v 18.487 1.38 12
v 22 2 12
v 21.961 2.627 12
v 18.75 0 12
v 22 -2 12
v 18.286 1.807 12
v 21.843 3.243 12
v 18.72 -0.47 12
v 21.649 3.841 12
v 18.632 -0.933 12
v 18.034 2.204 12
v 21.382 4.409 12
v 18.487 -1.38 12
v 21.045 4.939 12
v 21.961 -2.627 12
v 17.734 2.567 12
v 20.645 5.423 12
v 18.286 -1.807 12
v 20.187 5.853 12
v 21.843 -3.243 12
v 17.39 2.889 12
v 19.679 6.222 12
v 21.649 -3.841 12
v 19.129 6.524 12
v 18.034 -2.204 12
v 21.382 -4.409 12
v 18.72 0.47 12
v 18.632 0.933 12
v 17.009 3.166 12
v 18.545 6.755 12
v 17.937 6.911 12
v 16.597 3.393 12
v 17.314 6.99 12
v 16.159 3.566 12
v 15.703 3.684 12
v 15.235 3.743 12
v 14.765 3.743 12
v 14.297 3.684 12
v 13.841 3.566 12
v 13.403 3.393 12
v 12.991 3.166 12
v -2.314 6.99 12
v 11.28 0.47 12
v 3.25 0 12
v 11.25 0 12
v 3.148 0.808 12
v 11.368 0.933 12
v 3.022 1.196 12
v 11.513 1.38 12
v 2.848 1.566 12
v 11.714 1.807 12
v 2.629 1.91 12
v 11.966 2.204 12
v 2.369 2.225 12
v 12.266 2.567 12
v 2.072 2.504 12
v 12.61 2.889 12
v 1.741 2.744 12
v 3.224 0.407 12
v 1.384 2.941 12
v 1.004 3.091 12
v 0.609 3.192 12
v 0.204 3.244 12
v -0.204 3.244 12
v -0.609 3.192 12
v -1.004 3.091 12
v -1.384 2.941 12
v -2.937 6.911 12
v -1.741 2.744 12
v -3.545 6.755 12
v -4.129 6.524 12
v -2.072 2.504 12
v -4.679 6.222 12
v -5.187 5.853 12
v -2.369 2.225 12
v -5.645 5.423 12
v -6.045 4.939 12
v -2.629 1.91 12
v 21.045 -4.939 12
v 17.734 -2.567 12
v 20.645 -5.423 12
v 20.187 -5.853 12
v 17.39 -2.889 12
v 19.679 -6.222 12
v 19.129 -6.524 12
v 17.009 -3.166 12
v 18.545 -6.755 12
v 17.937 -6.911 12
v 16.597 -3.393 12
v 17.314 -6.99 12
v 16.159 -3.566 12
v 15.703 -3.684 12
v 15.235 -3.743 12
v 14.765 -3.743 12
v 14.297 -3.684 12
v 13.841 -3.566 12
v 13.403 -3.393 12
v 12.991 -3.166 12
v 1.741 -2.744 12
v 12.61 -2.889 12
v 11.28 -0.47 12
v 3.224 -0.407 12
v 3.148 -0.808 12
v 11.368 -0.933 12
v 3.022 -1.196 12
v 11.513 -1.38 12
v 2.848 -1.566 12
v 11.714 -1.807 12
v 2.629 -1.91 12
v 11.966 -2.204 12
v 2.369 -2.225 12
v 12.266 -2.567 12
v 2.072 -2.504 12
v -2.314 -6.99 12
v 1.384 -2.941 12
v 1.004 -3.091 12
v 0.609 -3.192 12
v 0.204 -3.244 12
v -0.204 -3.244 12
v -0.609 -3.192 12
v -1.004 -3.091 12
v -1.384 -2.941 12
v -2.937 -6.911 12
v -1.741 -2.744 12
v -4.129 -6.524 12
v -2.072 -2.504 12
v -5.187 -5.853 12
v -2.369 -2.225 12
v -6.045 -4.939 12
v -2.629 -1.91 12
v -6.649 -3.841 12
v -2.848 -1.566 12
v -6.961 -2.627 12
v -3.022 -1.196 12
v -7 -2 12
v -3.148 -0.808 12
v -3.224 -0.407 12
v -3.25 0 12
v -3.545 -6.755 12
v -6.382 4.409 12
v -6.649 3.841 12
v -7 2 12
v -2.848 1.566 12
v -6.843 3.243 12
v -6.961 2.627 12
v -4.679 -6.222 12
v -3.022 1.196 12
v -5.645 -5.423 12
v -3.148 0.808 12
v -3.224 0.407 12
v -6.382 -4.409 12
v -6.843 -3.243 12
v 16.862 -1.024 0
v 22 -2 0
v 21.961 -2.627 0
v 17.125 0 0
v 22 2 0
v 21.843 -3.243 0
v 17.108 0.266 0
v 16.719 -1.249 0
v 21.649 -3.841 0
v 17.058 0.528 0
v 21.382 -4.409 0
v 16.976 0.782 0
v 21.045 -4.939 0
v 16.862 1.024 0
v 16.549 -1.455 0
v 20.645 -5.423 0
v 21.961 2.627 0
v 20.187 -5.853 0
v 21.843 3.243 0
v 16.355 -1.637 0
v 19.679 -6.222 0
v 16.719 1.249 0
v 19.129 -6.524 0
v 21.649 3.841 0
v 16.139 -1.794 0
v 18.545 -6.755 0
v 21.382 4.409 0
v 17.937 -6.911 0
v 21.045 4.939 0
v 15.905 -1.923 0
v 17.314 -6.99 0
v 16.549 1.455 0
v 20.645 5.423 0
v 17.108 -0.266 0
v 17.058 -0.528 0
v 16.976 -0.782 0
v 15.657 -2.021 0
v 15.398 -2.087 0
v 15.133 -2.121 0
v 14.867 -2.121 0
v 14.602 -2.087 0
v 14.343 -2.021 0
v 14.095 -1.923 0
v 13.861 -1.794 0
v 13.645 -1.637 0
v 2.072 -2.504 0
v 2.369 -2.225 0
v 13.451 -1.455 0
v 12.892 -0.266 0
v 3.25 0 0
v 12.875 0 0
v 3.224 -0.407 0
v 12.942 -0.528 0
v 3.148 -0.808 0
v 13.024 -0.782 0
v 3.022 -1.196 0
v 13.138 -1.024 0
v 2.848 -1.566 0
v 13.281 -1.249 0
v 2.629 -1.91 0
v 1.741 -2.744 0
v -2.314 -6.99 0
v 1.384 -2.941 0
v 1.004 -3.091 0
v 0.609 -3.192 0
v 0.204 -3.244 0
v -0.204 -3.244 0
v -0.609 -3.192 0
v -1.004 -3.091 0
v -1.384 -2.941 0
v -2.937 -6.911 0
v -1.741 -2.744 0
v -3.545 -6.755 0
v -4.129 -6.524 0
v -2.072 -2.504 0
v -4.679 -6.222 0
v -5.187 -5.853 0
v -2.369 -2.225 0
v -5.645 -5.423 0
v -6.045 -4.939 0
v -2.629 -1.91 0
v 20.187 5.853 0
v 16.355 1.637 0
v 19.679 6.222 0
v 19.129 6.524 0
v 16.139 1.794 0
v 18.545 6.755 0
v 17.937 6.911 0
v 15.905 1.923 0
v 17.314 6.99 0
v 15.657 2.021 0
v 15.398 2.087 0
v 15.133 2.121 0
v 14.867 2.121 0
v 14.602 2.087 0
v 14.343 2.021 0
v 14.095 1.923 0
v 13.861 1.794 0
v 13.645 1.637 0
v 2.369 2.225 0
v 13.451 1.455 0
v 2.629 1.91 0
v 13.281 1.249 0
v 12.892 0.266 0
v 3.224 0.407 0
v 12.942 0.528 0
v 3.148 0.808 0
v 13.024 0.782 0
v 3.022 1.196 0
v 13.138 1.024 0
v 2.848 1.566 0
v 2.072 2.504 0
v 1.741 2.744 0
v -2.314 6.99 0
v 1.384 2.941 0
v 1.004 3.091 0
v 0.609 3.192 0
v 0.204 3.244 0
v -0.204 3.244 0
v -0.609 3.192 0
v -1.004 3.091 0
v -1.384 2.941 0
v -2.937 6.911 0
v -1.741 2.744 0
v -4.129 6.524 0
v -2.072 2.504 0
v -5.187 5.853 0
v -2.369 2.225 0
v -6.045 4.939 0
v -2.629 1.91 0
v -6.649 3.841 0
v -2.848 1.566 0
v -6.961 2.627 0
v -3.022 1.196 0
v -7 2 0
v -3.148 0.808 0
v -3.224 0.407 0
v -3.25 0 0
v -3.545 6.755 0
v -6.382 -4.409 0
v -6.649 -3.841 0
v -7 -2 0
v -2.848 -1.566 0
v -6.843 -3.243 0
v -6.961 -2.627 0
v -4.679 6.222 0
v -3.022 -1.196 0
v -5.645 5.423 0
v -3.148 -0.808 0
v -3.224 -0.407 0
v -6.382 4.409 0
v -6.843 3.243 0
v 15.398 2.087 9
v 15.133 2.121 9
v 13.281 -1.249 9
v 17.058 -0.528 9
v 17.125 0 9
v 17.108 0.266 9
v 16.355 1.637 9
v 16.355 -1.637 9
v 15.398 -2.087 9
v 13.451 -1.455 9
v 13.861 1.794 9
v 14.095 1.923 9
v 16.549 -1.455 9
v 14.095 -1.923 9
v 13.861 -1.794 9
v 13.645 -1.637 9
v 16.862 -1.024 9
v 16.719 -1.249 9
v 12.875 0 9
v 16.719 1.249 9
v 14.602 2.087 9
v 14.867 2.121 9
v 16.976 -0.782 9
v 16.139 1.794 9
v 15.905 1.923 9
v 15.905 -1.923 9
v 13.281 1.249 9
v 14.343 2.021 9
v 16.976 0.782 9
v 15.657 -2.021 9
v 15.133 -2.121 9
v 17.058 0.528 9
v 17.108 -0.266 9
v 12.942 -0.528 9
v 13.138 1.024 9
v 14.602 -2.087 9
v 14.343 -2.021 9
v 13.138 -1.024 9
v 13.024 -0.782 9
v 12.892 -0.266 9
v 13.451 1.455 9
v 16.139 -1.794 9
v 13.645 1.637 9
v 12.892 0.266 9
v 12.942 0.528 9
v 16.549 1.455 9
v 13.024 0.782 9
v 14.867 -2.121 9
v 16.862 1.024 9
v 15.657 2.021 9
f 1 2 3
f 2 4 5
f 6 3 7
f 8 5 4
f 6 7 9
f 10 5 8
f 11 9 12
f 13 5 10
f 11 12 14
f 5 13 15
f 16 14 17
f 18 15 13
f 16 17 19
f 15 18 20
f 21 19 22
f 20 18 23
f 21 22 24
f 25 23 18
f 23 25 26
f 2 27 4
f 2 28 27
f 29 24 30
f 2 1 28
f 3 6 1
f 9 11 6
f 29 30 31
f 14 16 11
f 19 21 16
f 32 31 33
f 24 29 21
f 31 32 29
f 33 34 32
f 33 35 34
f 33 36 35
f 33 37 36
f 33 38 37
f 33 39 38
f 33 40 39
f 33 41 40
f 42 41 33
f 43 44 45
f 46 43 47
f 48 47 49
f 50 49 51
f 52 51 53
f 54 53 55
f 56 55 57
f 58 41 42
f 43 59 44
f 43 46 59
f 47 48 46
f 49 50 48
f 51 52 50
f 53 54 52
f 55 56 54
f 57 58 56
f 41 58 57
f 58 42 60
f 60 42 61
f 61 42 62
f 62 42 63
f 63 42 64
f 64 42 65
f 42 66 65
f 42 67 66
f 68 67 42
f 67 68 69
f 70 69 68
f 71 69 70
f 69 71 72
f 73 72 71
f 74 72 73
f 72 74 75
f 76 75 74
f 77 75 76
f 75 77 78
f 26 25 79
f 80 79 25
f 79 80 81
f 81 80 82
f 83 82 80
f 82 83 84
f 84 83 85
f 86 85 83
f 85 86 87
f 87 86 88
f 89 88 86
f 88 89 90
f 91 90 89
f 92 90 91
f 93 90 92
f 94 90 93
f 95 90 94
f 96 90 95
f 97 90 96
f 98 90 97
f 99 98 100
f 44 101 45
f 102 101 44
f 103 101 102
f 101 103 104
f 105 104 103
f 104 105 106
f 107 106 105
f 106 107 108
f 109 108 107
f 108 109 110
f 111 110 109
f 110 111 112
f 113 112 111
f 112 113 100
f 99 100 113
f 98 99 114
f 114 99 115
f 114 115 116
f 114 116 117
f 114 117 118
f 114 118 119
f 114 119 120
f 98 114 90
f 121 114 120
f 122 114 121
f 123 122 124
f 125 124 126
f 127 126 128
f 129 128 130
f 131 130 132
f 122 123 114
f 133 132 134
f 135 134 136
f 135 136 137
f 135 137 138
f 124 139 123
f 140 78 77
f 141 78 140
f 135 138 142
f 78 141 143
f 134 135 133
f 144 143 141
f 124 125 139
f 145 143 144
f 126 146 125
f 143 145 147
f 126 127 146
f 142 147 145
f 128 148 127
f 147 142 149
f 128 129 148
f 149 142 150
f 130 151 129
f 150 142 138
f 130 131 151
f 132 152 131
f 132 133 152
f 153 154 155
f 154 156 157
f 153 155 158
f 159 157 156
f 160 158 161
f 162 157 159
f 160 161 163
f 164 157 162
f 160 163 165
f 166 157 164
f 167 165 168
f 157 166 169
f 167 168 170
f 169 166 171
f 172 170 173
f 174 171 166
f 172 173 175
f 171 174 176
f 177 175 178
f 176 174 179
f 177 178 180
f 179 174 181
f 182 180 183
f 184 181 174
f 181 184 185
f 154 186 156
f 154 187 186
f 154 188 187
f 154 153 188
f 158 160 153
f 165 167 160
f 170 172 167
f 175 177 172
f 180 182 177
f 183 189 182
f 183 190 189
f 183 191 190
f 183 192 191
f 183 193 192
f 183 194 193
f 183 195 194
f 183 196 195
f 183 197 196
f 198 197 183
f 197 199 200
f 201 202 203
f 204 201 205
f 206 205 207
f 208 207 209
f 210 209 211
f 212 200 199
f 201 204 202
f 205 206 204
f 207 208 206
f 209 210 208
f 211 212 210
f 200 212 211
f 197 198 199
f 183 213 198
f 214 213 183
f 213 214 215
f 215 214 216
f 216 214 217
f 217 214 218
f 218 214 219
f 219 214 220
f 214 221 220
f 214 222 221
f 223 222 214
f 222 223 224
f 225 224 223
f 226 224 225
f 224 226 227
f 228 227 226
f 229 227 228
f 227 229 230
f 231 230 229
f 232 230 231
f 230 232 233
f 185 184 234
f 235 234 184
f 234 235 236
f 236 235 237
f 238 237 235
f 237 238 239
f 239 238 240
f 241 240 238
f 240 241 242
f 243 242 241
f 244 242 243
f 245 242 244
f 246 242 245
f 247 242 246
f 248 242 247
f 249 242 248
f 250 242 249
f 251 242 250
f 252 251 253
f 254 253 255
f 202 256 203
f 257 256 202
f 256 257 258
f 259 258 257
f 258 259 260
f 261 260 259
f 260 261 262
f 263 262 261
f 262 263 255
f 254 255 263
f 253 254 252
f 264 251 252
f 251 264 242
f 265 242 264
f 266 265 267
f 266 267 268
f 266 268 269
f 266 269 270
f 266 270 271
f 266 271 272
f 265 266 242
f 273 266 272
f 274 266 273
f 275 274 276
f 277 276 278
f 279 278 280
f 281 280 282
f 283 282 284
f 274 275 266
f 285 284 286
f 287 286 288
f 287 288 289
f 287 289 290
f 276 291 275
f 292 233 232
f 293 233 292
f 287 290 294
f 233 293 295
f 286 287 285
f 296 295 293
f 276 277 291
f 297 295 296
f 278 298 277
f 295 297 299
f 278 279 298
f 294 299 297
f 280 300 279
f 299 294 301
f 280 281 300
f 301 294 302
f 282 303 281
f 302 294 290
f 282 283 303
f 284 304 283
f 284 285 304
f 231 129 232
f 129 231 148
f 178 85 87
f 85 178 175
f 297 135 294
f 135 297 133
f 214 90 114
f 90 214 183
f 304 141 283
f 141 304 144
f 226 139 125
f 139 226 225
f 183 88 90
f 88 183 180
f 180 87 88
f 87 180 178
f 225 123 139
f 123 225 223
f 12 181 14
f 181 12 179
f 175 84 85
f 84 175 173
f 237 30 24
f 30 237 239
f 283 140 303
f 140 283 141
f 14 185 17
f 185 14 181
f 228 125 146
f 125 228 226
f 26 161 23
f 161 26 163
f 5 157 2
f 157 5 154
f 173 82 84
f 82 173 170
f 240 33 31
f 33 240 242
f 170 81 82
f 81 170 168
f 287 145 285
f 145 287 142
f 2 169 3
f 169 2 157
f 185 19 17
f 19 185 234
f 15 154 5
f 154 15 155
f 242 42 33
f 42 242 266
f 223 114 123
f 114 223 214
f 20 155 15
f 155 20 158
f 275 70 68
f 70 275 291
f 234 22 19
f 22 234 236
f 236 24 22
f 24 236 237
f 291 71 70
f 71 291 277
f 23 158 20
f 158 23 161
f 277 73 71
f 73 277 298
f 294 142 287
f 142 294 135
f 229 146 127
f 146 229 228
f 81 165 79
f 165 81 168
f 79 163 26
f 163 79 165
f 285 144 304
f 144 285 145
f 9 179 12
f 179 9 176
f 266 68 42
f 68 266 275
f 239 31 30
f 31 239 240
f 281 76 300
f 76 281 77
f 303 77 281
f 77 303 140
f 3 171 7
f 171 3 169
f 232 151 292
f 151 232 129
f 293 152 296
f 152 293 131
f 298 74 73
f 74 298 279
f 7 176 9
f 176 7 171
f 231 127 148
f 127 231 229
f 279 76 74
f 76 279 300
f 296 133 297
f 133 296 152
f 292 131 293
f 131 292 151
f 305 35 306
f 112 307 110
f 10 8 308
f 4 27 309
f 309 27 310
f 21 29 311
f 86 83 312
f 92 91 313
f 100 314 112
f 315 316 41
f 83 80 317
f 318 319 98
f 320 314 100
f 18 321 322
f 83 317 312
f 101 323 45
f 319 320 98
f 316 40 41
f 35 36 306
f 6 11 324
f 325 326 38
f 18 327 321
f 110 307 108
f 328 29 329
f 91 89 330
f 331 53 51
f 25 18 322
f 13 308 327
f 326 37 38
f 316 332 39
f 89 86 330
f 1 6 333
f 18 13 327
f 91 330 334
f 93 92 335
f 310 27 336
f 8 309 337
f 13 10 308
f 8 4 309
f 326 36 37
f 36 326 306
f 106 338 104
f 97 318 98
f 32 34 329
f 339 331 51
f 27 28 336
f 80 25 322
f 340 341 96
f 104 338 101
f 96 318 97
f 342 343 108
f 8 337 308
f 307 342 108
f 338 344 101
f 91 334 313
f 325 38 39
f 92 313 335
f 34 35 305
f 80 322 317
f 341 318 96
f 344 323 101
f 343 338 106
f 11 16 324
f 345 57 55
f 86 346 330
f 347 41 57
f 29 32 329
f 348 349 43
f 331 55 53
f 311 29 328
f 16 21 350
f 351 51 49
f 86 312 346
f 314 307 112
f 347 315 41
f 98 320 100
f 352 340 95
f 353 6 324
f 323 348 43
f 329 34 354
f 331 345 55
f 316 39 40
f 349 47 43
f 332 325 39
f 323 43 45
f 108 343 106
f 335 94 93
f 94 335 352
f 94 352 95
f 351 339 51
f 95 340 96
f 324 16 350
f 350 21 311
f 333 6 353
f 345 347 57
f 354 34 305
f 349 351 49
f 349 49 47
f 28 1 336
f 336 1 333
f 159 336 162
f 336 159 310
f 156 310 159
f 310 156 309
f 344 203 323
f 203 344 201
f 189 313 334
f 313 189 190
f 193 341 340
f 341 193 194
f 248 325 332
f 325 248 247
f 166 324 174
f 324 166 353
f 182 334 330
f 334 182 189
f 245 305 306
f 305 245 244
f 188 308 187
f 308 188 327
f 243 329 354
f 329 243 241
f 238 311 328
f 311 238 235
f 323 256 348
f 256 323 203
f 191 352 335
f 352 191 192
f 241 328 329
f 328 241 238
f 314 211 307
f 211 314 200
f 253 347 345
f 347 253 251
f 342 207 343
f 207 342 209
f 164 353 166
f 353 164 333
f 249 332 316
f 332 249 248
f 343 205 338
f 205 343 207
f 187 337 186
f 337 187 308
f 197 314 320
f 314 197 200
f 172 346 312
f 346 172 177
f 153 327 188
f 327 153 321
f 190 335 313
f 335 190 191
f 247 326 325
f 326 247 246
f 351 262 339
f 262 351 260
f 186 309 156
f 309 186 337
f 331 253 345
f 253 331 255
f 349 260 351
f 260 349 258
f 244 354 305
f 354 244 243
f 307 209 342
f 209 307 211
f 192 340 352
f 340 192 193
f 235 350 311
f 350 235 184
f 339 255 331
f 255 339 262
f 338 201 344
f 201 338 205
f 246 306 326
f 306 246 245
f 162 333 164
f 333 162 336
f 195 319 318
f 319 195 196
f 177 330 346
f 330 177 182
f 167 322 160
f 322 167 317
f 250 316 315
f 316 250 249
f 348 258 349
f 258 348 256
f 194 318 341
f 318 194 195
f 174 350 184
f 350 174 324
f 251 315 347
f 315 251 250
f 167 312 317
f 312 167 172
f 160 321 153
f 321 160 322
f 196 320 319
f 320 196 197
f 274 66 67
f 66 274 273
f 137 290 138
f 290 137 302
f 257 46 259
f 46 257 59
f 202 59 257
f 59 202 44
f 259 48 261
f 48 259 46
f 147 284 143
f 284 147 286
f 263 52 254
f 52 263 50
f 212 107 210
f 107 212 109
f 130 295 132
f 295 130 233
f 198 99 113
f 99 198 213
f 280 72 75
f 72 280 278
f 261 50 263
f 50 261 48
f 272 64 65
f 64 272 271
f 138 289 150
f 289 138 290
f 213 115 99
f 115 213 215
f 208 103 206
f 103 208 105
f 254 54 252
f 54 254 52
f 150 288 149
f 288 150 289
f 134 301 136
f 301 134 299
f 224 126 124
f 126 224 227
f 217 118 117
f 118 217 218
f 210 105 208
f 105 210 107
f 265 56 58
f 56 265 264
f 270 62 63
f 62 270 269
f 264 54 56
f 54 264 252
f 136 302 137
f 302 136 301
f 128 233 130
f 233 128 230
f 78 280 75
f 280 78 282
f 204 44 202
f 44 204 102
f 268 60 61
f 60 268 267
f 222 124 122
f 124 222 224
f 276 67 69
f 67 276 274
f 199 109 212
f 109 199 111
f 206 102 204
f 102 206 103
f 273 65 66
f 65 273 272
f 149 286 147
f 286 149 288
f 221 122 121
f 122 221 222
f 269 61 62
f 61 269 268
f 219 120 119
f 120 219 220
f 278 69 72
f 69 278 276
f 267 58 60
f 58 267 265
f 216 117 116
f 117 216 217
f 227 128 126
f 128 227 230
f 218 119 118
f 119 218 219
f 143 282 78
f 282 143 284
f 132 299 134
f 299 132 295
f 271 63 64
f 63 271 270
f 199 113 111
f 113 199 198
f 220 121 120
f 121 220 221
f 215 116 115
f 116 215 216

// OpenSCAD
$fn = 50;


difference() {
	union() {
		cylinder(h = 12, r = 7.0000000000);
		translate(v = [7.5000000000, 0.0000000000, 0]) {
			hull() {
				translate(v = [-9.5000000000, 2.0000000000, 0]) {
					cylinder(h = 12, r = 5);
				}
				translate(v = [9.5000000000, 2.0000000000, 0]) {
					cylinder(h = 12, r = 5);
				}
				translate(v = [-9.5000000000, -2.0000000000, 0]) {
					cylinder(h = 12, r = 5);
				}
				translate(v = [9.5000000000, -2.0000000000, 0]) {
					cylinder(h = 12, r = 5);
				}
			}
		}
		translate(v = [7.5000000000, 0.0000000000, 0]) {
			hull() {
				translate(v = [-9.5000000000, 2.0000000000, 0]) {
					cylinder(h = 12, r = 5);
				}
				translate(v = [9.5000000000, 2.0000000000, 0]) {
					cylinder(h = 12, r = 5);
				}
				translate(v = [-9.5000000000, -2.0000000000, 0]) {
					cylinder(h = 12, r = 5);
				}
				translate(v = [9.5000000000, -2.0000000000, 0]) {
					cylinder(h = 12, r = 5);
				}
			}
		}
	}
	union() {
		translate(v = [15.0000000000, 0.0000000000, 12]) {
			rotate(a = [0, 0, 0]) {
				difference() {
					union() {
						#translate(v = [0, 0, -12.0000000000]) {
							cylinder(h = 12, r = 2.0000000000);
						}
						#translate(v = [0, 0, -3]) {
							cylinder(h = 3, r1 = 2.1250000000, r2 = 3.7500000000);
						}
						#translate(v = [0, 0, -12.0000000000]) {
							cylinder(h = 12, r = 2.1250000000);
						}
						#translate(v = [0, 0, -12.0000000000]) {
							cylinder(h = 12, r = 2.0000000000);
						}
					}
					union();
				}
			}
		}
		translate(v = [15.0000000000, 0.0000000000, 12]) {
			rotate(a = [0, 0, 0]) {
				difference() {
					union() {
						#translate(v = [0, 0, -12.0000000000]) {
							cylinder(h = 12, r = 2.0000000000);
						}
						#translate(v = [0, 0, -3]) {
							cylinder(h = 3, r1 = 2.1250000000, r2 = 3.7500000000);
						}
						#translate(v = [0, 0, -12.0000000000]) {
							cylinder(h = 12, r = 2.1250000000);
						}
						#translate(v = [0, 0, -12.0000000000]) {
							cylinder(h = 12, r = 2.0000000000);
						}
					}
					union();
				}
			}
		}
		translate(v = [0, 0, -100]) {
			cylinder(h = 200, r = 3.2500000000);
		}
		translate(v = [0, 0, -100]) {
			cylinder(h = 200, r = 1.8000000000);
		}
	}
}
